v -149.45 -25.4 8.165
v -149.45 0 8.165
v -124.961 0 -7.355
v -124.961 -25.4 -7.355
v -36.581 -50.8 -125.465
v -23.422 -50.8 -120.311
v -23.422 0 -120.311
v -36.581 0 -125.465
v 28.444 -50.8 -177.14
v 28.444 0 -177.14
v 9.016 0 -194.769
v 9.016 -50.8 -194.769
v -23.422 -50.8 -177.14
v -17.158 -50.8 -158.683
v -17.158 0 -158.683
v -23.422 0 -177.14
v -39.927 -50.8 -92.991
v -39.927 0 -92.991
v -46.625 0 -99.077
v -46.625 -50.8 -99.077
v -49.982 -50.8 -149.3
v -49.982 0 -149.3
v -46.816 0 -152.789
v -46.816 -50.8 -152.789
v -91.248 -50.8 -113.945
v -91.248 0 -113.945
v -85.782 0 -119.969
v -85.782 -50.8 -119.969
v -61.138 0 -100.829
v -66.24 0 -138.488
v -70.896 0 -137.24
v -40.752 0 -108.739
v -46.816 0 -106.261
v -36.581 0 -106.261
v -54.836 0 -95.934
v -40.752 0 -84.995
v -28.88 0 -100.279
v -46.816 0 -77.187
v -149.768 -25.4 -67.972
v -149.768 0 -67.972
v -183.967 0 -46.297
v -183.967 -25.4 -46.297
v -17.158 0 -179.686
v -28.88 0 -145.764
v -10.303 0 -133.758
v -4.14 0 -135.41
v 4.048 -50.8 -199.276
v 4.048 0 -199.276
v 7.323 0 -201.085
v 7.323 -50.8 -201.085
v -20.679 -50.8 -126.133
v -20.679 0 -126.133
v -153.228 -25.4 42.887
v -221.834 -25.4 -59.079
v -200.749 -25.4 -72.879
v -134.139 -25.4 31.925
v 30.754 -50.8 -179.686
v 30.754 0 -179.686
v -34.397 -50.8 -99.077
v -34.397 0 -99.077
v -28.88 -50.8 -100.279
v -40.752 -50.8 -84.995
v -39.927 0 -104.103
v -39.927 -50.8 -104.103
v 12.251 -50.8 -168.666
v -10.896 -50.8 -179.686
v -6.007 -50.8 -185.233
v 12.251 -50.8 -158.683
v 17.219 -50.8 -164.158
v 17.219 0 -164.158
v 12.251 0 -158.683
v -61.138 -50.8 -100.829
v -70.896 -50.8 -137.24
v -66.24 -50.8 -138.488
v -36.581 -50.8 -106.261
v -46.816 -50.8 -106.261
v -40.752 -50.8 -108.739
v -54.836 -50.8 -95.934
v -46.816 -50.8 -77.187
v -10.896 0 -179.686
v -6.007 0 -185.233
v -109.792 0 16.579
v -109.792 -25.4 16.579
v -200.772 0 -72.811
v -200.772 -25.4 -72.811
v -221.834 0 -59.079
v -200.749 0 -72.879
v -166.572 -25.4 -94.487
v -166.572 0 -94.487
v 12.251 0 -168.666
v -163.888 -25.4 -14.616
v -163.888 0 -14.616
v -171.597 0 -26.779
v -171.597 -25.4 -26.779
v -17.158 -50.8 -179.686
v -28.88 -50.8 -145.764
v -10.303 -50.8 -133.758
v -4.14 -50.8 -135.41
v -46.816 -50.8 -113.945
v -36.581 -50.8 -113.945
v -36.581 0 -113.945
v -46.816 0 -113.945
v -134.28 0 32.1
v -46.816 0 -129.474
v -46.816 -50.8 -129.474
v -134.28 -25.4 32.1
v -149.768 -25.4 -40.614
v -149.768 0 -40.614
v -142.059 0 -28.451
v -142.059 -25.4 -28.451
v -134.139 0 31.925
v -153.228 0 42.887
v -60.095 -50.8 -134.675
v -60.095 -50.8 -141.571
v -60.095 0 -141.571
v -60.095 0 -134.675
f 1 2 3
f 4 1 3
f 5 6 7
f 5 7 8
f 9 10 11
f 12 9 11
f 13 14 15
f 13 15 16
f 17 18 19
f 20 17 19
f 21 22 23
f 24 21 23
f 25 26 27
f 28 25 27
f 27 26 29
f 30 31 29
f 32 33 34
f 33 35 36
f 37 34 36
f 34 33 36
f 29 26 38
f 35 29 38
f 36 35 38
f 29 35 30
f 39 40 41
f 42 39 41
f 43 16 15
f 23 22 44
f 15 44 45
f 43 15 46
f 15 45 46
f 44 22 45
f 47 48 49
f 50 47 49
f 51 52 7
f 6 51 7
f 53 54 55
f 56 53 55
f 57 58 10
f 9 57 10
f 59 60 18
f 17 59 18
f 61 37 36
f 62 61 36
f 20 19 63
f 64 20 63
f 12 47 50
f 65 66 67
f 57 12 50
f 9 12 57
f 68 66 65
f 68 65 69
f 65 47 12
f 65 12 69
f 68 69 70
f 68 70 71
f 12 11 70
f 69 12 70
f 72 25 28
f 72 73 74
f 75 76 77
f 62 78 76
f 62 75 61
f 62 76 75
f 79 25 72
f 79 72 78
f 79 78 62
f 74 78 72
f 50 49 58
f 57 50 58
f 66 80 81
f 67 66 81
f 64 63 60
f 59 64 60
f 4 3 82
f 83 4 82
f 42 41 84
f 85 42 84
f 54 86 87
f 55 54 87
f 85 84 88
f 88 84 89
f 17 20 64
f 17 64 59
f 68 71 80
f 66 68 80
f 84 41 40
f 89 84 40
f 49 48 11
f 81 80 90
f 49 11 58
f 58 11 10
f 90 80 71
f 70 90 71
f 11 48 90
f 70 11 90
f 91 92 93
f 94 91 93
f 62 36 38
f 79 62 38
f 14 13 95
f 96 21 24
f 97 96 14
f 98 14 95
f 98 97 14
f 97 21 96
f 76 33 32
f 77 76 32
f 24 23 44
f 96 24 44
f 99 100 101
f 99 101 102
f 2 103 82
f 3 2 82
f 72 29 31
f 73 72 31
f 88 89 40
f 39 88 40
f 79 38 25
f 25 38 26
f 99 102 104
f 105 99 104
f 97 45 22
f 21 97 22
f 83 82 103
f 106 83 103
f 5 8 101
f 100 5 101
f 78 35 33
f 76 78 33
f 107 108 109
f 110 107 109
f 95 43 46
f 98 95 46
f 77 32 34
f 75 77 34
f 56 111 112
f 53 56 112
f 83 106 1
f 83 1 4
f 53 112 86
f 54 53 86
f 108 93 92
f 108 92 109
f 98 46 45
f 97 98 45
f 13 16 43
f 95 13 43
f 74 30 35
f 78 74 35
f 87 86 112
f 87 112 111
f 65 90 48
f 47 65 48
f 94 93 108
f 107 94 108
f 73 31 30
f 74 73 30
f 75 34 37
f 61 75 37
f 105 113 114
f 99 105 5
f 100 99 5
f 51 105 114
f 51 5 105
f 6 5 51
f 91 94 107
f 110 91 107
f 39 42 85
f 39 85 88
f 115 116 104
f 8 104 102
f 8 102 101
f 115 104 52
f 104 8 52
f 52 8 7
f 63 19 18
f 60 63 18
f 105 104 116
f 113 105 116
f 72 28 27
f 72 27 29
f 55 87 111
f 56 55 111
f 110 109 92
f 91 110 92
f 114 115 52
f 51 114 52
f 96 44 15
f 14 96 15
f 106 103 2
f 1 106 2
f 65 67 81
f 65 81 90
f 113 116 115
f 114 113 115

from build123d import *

# Parameters (mm, degrees)
F2_DEPTH = 25.4
F5_DEPTH = 50.8


with BuildPart() as f2:
    # F1 (on Front) → F2 (new body)
    with BuildSketch(Plane.XZ):
        Polygon((-200.7486671209, -72.8788375854), (-134.1392695904, 31.924854964), (-153.2281637192, 42.8873971105), (-221.8337059021, -59.0789616108), align=None)
    extrude(amount=F2_DEPTH)


with BuildPart() as f2b:
    # F0 (on Front) → F2, piece 2 (new body)
    with BuildSketch(Plane.XZ):
        Polygon((-134.2803835869, 32.1001149714), (-149.450007216, 8.1652749375), (-124.9612532579, -7.3554129034), (-109.7916296289, 16.5794271305), align=None)
    extrude(amount=F2_DEPTH)


with BuildPart() as f2c:
    # F0 (on Front) → F2, piece 3 (new body)
    with BuildSketch(Plane.XZ):
        Polygon((-142.0590088453, -28.450820074), (-163.8883034377, -14.6156666915), (-171.5970264872, -26.7785955529), (-149.7677318947, -40.6137489354), align=None)
    extrude(amount=F2_DEPTH)


with BuildPart() as f2d:
    # F0 (on Front) → F2, piece 4 (new body)
    with BuildSketch(Plane.XZ):
        Polygon((-149.7677318947, -67.9721375065), (-183.9674201976, -46.2967722627), (-200.7720470428, -72.8113427758), (-166.57235874, -94.4867080196), align=None)
    extrude(amount=F2_DEPTH)


with BuildPart() as f5:
    # F3 (on Front) → F5 (new body)
    with BuildSketch(Plane.XZ):
        Polygon((17.2187387786, -164.1581819836), (12.250800617, -158.6832260941), (-10.8956162127, -179.6861290932), (-6.0069423464, -185.2330088712), (12.250800617, -168.6660556679), align=None)
        Polygon((28.4437571682, -177.1399527788), (9.0159587106, -194.7686064703), (7.3233359407, -201.084989581), (30.7541404358, -179.6861290932), align=None)
        Polygon((9.0159587106, -194.7686064703), (17.2187387786, -164.1581819836), (12.250800617, -168.6660556679), (4.0480205491, -199.2764801546), align=None)
        Polygon((7.3233359407, -201.084989581), (9.0159587106, -194.7686064703), (4.0480205491, -199.2764801546), align=None)
    extrude(amount=F5_DEPTH)


with BuildPart() as f5b:
    # F3 (on Front) → F5, piece 2 (new body)
    with BuildSketch(Plane.XZ):
        Polygon((-28.8802379445, -100.2793381423), (-40.7517962158, -84.9945247173), (-54.8363216213, -95.9338315591), (-46.8156449497, -106.2605758387), (-40.7517962158, -108.7391674519), (-36.5811732513, -106.2605758387), align=None)
        Polygon((-66.2396103144, -138.487637043), (-54.8363216213, -95.9338315591), (-61.1383294086, -100.8285365577), (-70.8956203459, -137.2399501218), align=None)
        Polygon((-54.8363216213, -95.9338315591), (-40.7517962158, -84.9945247173), (-46.8156449497, -77.1872264321), (-91.2482365966, -113.9447018504), (-85.7818871737, -119.9689358473), (-61.1383294086, -100.8285365577), (-60.0946135819, -96.9336881972), align=None)
        Polygon((-61.1383294086, -100.8285365577), (-54.8363216213, -95.9338315591), (-60.0946135819, -96.9336881972), align=None)
    extrude(amount=F5_DEPTH)


with BuildPart() as f5c:
    # F3 (on Front) → F5, piece 3 (new body)
    with BuildSketch(Plane.XZ):
        Polygon((-46.8156449497, -129.4741981435), (-36.5811732513, -125.4654534497), (-36.5811732513, -113.9447018504), (-46.8156449497, -113.9447018504), (-46.8156449497, -120.3112053809), align=None)
        Polygon((-60.0946135819, -141.5711641312), (-20.6791479141, -126.1325031519), (-23.4221895759, -120.3112053809), (-36.5811732513, -125.4654534497), (-46.8156449497, -129.4741981435), (-60.0946135819, -134.6754431725), align=None)
    extrude(amount=F5_DEPTH)


with BuildPart() as f5d:
    # F3 (on Front) → F5, piece 4 (new body)
    with BuildSketch(Plane.XZ):
        Polygon((-28.8802379445, -145.7642225958), (-10.3028491139, -138.487637043), (-10.3028491139, -133.7581687008), (-49.9818195821, -149.3000419905), (-46.8156449497, -152.7893500067), align=None)
        Polygon((-17.157621035, -158.6832260941), (-10.3028491139, -138.487637043), (-28.8802379445, -145.7642225958), align=None)
        Polygon((-10.3028491139, -133.7581687008), (-10.3028491139, -138.487637043), (-17.157621035, -158.6832260941), (-23.4221895759, -177.1399527788), (-17.157621035, -179.6861290932), (-4.1395589314, -135.4097666355), align=None)
    extrude(amount=F5_DEPTH)


with BuildPart() as f5e:
    # F4 (on Front) → F5, piece 5 (new body)
    with BuildSketch(Plane.XZ):
        Polygon((-34.3966597908, -99.0771427751), (-39.9274900556, -92.9909944534), (-46.624712646, -99.0771427751), (-39.9274900556, -104.1033238342), align=None)
    extrude(amount=F5_DEPTH)


solid = Compound([f2.part, f2b.part, f2c.part, f2d.part, f5.part, f5b.part, f5c.part, f5d.part, f5e.part])
